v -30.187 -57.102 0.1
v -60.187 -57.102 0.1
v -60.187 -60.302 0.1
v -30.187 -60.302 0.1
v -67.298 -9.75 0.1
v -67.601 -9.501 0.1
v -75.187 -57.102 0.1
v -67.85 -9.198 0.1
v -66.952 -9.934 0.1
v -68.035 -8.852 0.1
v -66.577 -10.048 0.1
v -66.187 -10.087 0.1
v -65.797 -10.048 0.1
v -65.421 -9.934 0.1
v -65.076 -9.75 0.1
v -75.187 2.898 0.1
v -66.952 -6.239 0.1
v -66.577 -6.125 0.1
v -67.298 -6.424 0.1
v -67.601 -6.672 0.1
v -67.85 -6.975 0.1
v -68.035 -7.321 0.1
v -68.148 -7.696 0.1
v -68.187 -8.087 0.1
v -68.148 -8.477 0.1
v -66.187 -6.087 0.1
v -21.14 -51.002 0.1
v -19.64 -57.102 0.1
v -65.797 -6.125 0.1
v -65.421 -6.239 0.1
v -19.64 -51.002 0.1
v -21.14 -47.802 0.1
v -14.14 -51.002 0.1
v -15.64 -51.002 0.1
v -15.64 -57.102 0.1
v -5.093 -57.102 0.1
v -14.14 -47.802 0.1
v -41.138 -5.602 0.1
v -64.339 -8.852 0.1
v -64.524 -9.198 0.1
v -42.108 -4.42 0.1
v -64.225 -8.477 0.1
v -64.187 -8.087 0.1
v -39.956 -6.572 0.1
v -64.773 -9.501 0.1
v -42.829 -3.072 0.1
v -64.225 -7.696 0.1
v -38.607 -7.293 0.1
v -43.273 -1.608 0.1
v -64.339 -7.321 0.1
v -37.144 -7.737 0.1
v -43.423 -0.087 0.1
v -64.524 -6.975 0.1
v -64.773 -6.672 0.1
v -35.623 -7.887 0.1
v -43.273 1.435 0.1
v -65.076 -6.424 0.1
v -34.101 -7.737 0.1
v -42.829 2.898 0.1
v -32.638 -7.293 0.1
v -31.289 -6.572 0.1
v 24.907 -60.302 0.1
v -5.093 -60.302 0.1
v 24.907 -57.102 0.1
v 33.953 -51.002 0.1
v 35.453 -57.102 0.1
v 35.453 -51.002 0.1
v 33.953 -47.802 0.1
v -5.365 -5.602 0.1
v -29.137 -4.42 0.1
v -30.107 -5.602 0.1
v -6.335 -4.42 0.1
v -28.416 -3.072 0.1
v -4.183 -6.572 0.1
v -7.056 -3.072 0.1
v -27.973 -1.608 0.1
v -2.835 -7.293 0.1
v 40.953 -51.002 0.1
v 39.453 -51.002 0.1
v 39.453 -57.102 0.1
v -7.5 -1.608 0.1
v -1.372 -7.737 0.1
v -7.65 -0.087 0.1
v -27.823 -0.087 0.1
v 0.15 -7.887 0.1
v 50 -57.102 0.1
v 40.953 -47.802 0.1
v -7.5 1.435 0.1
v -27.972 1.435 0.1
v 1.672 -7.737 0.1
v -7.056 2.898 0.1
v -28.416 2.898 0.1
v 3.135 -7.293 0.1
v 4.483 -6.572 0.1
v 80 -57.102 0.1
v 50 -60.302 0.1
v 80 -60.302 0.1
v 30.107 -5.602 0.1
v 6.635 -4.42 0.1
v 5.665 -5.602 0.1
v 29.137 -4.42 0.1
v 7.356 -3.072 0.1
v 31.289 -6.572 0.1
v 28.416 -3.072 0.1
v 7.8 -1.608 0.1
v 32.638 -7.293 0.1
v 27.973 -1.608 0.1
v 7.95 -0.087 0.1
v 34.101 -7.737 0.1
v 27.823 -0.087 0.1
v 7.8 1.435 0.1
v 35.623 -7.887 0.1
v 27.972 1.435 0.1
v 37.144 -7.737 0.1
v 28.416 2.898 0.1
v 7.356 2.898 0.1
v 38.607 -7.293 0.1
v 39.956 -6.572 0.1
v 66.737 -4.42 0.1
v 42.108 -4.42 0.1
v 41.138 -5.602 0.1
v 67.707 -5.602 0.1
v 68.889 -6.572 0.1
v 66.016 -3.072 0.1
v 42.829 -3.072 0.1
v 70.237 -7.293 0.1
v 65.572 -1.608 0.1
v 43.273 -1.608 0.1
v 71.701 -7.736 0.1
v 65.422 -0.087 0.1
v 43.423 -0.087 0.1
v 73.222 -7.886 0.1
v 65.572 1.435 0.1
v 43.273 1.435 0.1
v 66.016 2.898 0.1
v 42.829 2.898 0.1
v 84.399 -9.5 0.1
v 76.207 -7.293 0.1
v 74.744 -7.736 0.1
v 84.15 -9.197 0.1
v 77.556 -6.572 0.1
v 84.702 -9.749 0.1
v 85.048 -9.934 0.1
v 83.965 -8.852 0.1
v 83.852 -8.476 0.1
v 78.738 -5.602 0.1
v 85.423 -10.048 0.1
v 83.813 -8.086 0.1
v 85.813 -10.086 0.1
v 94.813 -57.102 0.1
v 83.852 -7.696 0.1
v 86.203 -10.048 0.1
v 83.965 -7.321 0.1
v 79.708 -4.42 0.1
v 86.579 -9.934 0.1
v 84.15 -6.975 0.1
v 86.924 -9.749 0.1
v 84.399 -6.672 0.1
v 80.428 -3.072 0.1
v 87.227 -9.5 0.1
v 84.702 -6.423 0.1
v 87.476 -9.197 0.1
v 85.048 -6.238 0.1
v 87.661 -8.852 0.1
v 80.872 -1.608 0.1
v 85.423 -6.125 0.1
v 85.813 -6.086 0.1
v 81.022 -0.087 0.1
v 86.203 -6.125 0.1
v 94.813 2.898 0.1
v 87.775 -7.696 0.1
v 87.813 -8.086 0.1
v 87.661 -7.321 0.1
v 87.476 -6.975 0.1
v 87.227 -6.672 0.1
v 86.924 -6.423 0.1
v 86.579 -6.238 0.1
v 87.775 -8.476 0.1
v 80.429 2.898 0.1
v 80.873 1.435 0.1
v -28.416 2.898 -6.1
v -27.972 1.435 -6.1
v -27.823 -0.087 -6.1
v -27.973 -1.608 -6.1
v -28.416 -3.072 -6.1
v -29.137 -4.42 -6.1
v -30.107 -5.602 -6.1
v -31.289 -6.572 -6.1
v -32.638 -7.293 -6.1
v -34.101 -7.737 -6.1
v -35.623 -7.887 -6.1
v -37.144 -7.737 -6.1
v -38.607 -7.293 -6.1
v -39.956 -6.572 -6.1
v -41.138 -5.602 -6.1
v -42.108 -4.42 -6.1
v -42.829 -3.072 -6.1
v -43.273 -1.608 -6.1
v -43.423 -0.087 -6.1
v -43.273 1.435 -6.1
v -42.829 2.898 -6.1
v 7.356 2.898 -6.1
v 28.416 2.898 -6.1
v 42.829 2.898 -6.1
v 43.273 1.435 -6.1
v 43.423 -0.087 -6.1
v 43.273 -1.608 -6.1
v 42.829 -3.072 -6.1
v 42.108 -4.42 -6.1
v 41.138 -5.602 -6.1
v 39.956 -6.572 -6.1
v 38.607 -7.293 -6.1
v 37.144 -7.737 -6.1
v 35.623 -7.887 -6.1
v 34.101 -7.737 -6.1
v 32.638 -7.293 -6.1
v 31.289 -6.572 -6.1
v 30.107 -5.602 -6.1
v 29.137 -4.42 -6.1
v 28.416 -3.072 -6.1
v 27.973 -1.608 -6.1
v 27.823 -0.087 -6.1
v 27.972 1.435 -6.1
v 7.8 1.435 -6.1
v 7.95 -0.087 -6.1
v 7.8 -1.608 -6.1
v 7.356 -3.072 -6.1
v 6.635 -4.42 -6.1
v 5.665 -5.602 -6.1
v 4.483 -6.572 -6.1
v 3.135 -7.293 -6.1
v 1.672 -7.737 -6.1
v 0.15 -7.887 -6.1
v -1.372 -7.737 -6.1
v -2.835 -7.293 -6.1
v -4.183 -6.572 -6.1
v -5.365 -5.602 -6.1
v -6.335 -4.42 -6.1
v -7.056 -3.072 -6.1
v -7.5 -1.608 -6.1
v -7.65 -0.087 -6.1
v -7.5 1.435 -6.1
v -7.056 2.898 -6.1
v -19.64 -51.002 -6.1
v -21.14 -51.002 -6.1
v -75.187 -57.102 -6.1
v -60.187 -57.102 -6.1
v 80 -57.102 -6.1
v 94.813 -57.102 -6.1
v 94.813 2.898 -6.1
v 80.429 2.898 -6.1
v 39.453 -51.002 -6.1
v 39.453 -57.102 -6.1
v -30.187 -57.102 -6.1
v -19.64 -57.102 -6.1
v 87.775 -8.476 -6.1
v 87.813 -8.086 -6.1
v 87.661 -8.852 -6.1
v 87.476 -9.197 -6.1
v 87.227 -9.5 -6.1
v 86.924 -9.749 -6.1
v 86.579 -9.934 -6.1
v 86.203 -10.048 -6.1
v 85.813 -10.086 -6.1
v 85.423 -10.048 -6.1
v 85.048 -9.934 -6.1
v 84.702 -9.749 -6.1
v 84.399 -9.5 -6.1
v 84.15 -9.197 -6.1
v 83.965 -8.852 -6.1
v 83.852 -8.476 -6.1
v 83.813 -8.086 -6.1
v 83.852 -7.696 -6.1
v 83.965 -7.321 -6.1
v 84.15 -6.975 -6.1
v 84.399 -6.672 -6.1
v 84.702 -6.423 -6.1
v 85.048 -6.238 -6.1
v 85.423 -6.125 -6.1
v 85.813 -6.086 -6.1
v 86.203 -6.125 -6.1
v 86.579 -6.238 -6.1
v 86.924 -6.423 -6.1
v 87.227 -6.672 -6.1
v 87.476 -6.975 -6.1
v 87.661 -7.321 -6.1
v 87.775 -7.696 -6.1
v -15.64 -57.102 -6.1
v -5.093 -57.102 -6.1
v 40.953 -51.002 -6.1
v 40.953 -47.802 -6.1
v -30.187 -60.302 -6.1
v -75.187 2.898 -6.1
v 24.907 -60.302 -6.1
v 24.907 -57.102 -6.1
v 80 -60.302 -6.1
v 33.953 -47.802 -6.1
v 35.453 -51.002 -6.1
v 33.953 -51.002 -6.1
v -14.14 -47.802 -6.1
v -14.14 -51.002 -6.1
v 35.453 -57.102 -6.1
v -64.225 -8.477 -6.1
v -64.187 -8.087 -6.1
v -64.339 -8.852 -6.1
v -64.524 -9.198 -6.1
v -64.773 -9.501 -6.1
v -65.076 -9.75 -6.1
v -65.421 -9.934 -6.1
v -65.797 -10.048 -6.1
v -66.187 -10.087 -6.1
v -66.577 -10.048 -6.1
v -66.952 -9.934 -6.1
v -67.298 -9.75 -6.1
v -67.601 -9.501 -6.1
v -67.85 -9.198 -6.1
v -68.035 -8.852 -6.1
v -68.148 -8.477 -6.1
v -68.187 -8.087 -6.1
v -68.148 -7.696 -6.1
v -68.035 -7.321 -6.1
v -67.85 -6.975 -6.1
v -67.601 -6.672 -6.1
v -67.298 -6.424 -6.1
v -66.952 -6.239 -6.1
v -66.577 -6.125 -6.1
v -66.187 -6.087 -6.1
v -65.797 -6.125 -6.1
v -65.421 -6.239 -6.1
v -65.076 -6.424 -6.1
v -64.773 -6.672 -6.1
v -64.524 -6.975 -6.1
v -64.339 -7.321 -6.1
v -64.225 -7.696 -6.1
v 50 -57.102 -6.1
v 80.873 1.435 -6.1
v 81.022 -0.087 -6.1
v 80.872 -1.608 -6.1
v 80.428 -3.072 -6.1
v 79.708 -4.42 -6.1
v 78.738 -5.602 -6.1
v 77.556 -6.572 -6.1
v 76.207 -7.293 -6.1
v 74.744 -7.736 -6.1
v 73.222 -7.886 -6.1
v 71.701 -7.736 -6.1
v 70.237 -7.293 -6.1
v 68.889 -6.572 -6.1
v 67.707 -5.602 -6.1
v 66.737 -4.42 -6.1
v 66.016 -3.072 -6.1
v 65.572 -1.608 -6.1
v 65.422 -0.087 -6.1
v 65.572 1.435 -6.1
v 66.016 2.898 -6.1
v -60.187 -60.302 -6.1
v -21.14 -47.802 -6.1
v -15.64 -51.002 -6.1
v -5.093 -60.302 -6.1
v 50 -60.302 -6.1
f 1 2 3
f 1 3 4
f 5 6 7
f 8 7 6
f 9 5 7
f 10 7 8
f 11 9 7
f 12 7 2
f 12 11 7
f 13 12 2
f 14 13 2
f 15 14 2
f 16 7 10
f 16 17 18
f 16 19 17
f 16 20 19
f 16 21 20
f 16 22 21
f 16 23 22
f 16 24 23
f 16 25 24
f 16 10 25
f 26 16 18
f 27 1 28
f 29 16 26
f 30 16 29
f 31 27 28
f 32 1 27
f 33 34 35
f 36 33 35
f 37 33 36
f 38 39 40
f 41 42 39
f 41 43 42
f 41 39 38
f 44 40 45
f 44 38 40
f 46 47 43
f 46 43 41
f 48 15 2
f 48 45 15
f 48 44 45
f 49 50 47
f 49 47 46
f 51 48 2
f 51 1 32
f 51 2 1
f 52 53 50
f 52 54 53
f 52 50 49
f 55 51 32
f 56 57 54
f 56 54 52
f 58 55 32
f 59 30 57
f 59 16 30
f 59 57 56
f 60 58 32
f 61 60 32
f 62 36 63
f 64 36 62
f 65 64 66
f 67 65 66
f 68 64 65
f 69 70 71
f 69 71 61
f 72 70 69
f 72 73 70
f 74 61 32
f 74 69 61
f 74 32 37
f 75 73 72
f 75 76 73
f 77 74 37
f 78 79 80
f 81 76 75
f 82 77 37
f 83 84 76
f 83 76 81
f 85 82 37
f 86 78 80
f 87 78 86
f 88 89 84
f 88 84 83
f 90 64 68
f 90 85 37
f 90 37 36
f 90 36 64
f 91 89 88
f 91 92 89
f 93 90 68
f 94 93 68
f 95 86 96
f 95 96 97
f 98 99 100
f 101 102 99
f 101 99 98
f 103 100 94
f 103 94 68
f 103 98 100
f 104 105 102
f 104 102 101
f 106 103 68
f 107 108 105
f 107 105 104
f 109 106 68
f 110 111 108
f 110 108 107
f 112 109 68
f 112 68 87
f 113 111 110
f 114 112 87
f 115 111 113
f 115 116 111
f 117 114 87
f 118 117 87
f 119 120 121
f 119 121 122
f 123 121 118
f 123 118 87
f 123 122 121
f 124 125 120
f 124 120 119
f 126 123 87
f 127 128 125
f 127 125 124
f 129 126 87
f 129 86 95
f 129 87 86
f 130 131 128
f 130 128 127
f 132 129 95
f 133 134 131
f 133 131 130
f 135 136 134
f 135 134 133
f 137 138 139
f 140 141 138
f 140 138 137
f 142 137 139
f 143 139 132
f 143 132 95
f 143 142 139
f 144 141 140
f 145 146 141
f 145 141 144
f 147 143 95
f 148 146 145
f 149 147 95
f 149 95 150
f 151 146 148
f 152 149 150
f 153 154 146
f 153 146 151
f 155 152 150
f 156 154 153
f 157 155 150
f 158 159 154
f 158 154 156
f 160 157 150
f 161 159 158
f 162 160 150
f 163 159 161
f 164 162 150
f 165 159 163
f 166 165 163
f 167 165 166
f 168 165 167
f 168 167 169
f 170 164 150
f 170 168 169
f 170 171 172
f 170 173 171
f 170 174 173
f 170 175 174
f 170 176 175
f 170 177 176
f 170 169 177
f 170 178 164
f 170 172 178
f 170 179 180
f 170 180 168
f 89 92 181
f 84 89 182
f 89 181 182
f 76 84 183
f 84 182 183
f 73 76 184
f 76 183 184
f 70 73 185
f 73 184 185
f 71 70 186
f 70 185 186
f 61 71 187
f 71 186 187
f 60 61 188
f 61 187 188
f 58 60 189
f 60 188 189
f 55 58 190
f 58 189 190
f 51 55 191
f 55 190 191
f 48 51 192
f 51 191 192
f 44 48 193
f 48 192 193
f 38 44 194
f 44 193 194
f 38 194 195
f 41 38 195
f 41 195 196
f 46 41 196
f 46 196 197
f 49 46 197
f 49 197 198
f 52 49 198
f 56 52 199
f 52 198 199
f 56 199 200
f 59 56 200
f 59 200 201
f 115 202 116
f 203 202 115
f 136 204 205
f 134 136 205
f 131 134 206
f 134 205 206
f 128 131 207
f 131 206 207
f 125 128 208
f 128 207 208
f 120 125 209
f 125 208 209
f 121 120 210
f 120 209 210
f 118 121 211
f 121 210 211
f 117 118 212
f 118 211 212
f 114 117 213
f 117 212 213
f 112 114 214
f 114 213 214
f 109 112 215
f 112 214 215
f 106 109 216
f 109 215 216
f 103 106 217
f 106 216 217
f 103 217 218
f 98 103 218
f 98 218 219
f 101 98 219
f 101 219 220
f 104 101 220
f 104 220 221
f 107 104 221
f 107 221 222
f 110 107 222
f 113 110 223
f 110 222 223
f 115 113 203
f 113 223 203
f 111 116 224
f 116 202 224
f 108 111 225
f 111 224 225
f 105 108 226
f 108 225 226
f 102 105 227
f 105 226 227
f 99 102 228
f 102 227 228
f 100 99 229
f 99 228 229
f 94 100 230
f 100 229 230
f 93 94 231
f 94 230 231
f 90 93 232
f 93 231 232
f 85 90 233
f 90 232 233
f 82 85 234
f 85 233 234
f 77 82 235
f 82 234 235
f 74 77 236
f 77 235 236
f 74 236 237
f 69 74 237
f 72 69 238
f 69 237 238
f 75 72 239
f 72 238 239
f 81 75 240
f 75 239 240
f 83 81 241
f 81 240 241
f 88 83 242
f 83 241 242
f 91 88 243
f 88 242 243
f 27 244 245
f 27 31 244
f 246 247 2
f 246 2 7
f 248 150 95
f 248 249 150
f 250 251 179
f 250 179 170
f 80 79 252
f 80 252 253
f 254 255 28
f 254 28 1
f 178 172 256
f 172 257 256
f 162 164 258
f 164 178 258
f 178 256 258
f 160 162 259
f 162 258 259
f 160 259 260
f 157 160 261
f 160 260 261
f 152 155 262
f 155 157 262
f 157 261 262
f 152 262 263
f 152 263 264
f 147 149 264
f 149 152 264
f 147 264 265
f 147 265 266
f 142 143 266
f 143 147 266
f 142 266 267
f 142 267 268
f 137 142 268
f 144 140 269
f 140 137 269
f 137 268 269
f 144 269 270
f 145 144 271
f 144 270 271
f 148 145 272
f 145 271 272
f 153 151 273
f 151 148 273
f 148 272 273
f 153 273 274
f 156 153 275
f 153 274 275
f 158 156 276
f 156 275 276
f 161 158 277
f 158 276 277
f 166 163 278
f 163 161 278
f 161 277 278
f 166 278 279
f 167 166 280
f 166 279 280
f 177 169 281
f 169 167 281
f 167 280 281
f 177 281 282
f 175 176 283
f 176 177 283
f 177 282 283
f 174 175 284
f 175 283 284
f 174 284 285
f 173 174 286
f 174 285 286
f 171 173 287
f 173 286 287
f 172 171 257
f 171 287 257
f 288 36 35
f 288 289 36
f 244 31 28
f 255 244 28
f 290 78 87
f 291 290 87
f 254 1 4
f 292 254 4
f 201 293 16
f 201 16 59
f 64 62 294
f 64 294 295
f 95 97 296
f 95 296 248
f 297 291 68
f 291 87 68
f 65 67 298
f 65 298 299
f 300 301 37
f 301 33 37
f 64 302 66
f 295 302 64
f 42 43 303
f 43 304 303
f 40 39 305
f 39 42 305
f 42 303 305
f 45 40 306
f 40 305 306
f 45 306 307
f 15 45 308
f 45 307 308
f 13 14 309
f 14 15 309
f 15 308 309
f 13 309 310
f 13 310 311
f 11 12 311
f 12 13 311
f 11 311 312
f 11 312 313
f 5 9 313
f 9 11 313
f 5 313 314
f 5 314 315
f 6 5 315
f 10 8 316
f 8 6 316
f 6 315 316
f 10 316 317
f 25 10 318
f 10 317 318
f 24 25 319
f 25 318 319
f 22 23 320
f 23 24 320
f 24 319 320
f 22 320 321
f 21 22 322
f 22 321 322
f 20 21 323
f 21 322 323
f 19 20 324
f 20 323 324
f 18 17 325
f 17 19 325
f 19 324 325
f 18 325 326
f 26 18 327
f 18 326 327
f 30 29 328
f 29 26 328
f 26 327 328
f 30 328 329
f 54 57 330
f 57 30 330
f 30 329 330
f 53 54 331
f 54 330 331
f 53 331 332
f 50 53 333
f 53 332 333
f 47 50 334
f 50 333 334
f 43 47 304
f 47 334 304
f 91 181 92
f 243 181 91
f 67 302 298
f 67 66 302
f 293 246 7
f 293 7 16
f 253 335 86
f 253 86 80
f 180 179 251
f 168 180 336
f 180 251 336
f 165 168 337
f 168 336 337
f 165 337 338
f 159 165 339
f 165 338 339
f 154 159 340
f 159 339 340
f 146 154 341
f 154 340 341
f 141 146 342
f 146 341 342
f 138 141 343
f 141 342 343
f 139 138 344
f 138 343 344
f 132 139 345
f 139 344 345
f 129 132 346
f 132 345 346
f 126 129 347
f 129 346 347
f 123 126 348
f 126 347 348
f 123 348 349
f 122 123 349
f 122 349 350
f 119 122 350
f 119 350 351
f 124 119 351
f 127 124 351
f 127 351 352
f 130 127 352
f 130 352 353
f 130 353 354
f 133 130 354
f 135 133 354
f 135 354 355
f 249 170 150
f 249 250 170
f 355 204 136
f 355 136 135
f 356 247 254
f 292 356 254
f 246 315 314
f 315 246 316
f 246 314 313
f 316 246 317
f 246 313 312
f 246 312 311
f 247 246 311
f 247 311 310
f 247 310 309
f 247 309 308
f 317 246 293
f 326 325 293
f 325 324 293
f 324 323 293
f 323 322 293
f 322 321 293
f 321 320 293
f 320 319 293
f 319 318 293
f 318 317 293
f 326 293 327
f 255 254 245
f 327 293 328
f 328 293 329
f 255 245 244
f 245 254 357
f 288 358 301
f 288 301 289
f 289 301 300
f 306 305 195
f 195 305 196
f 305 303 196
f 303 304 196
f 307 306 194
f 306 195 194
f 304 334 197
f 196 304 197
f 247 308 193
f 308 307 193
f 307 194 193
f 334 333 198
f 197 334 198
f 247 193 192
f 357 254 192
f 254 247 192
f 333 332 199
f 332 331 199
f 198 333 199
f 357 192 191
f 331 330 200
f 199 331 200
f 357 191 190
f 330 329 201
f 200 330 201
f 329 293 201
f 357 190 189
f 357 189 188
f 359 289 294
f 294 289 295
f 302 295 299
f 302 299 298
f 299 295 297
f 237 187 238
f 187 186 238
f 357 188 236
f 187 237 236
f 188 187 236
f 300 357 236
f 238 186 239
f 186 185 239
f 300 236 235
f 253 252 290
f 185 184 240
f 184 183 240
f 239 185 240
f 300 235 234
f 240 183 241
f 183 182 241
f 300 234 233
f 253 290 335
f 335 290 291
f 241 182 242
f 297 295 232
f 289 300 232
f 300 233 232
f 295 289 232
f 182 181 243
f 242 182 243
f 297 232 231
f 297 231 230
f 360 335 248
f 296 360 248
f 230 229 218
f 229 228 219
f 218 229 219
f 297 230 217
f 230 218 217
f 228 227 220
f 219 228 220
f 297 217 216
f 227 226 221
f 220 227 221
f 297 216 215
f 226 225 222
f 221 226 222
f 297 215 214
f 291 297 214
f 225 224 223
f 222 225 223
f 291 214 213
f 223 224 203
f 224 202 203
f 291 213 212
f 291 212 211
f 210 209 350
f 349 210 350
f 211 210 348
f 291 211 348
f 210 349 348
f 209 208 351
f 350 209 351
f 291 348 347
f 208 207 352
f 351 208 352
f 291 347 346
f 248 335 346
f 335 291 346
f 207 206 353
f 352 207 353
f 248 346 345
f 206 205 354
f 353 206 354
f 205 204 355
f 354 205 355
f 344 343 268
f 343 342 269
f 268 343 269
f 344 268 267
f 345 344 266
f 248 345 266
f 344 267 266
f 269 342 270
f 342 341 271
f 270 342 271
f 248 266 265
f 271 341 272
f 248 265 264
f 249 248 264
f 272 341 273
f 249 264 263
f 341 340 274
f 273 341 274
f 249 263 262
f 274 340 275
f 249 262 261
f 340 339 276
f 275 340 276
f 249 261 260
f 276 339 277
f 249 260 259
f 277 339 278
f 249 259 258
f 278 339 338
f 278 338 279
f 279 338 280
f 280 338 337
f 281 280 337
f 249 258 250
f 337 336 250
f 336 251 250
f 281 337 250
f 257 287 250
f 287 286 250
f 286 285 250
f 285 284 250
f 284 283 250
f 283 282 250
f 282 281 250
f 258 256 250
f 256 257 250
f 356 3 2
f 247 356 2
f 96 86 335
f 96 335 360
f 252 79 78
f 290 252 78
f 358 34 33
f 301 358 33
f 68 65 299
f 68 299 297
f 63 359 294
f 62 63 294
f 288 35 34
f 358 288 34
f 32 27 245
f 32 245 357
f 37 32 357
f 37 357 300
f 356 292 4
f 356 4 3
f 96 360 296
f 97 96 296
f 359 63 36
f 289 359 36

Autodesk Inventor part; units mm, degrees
ref_plane "YZ Plane" through (0, 0, 0) normal (1, 0, 0) x (0, 1, 0)
ref_plane "XZ Plane" through (0, 0, 0) normal (0, 1, 0) x (-1, 0, 0)
ref_plane "XY Plane" through (0, 0, 0) normal (0, 0, 1) x (1, 0, 0)
sketch "Sketch1" plane through (0, 0, 0) normal (0, 0, 1) x (1, 0, 0)
  circle A0 centre (0.15, -0.0866) radius 7.5 projected
  circle A1 centre (35.6226, -0.0866) radius 7.5 projected
  line L0 (-37.4458, 2.8981) -> (-34.0994, 2.8981) projected
  line L1 (-39.119, 0) -> (-37.4458, 2.8981) projected
  line L2 (-37.4458, -2.8981) -> (-39.119, 0) projected
  line L3 (-34.0994, -2.8981) -> (-37.4458, -2.8981) projected
  line L4 (-32.4262, 0) -> (-34.0994, -2.8981) projected
  line L5 (-34.0994, 2.8981) -> (-32.4262, 0) projected
  line L6 (71.3985, 2.8989) -> (74.7449, 2.8989) projected
  line L7 (69.7253, 0.0008) -> (71.3985, 2.8989) projected
  line L8 (71.3985, -2.8973) -> (69.7253, 0.0008) projected
  line L9 (74.7449, -2.8973) -> (71.3985, -2.8973) projected
  line L10 (76.4181, 0.0008) -> (74.7449, -2.8973) projected
  line L11 (74.7449, 2.8989) -> (76.4181, 0.0008) projected
  line L12 (94.8132, 2.8981) -> (94.8132, -57.1019)
  line L13 (-75.1868, -57.1019) -> (-75.1868, 2.8981)
  line L14 (-75.1868, 2.8981) -> (94.8132, 2.8981)
  circle A2 centre (-35.6226, -0.0866) radius 7.5 projected
  circle A3 centre (73.2223, -0.0862) radius 7.5 projected
  circle A4 centre (-35.6226, -0.0866) radius 7.8
  circle A5 centre (0.15, -0.0866) radius 7.8
  circle A6 centre (35.6226, -0.0866) radius 7.8
  circle A7 centre (73.2223, -0.0862) radius 7.8
  circle A8 centre (85.8132, -8.0862) radius 2
  line L15 (73.2223, -0.0862) -> (73.2223, 6.7764) construction
  circle A9 centre (-66.1868, -8.0866) radius 2
  line L16 (95, -57.1019) -> (-75.1868, -57.1019)
  line L17 (-60.1868, -57.1019) -> (-30.1868, -57.1019)
  line L18 (-30.1868, -57.1019) -> (-30.1868, -60.3019)
  line L19 (-30.1868, -60.3019) -> (-60.1868, -60.3019)
  line L20 (-60.1868, -60.3019) -> (-60.1868, -57.1019)
  line L21 (9.9066, -57.1019) -> (9.9066, -41.5844) construction
  line L22 (9.9066, -57.1019) -> (9.9066, -60.3019)
  line L23 (9.9066, -60.3019) -> (-5.0934, -60.3019)
  line L24 (-5.0934, -60.3019) -> (-5.0934, -57.1019)
  line L25 (50, -57.1019) -> (50, -60.3019)
  line L26 (50, -60.3019) -> (80, -60.3019)
  line L27 (80, -60.3019) -> (80, -57.1019)
  line L28 (9.9066, -60.3019) -> (24.9066, -60.3019)
  line L29 (24.9066, -60.3019) -> (24.9066, -57.1019)
  point P0 (0, 0)
  point P1 (80.4289, 2.8981)
  point P2 (66.0158, 2.8981)
  point P3 (42.8289, 2.8981)
  point P4 (28.4162, 2.8981)
  point P5 (7.3564, 2.8981)
  point P6 (-7.0564, 2.8981)
  point P7 (-28.4162, 2.8981)
  point P8 (-42.8289, 2.8981)
  point P9 (94.8132, -57.1019)
  point P10 (-30.1868, -57.1019)
  point P11 (24.9066, -57.1019)
  point P12 (50, -57.1019)
  point P13 (80, -57.1019)
  dimension "d2" = 170
  dimension "d4" = 0.3
  dimension "d5" = 0.3
  dimension "d6" = 0.3
  dimension "d7" = 0.3
  dimension "d17" = 4
  dimension "d19" = 8
  dimension "d24" = 9
  dimension "d42" = 60
  dimension "d43" = 30
  dimension "d44" = 3.2
  dimension "d45" = 15
  dimension "d46" = 75.1868
  dimension "d47" = 94.8132
  dimension "d48" = 9
  dimension "d49" = 8
  dimension "d50" = 4
  dimension "d51" = 3.2
  dimension "d52" = 15
  dimension "d53" = 25.0934
extrude "Extrusion3" add sketch "Sketch1" along normal blind 0.1 and the other way blind 6.1 contours L14 A6 A7 L12 L16 L13 A4 A5 | L16 L18 L19 L20 | L27 L26 L25 L16 | L16 L22 L23 L24 | L16 L29 L28 L22
sketch "Sketch2" plane through (0, 0, 0.1) normal (0, 0, 1) x (1, 0, 0)
  line L0 (-5.0934, -60.3019) -> (24.9066, -60.3019) projected
  line L1 (24.9066, -60.3019) -> (-5.0934, -60.3019) projected
  line L2 (9.9066, -60.3019) -> (9.9066, -41.2301) construction
  line L3 (-30.1868, -57.1019) -> (-5.0934, -57.1019) projected
  line L4 (-17.6401, -57.1019) -> (-17.6401, -48.823) construction
  line L5 (-19.6401, -57.1019) -> (-15.6401, -57.1019)
  line L6 (-15.6401, -57.1019) -> (-15.6401, -51.0019)
  line L7 (-19.6401, -51.0019) -> (-19.6401, -57.1019)
  line L8 (-17.6401, -51.0019) -> (-14.1401, -51.0019)
  line L9 (-14.1401, -51.0019) -> (-14.1401, -47.8019)
  line L10 (-19.6401, -51.0019) -> (-15.6401, -51.0019)
  line L11 (-17.6401, -51.0019) -> (-21.1401, -51.0019)
  line L12 (-21.1401, -51.0019) -> (-21.1401, -47.8019)
  line L13 (-21.1401, -47.8019) -> (-14.1401, -47.8019)
  line L14 (37.4533, -57.1019) -> (37.4533, -48.823) construction
  line L15 (39.4533, -57.1019) -> (35.4533, -57.1019)
  line L16 (35.4533, -57.1019) -> (35.4533, -51.0019)
  line L17 (39.4533, -51.0019) -> (39.4533, -57.1019)
  line L18 (37.4533, -51.0019) -> (33.9533, -51.0019)
  line L19 (33.9533, -51.0019) -> (33.9533, -47.8019)
  line L20 (39.4533, -51.0019) -> (35.4533, -51.0019)
  line L21 (37.4533, -51.0019) -> (40.9533, -51.0019)
  line L22 (40.9533, -51.0019) -> (40.9533, -47.8019)
  line L23 (40.9533, -47.8019) -> (33.9533, -47.8019)
  point P0 (0, 0)
  dimension "d64" = 2
  dimension "d65" = 3.5
  dimension "d66" = 3.2
  dimension "d67" = 4
  dimension "d68" = 6.1
  dimension "d69" = 7
extrude "Extrusion4" cut sketch "Sketch2" against normal blind 7
properties part number "Carcasa_CajaR_Lateral1"
